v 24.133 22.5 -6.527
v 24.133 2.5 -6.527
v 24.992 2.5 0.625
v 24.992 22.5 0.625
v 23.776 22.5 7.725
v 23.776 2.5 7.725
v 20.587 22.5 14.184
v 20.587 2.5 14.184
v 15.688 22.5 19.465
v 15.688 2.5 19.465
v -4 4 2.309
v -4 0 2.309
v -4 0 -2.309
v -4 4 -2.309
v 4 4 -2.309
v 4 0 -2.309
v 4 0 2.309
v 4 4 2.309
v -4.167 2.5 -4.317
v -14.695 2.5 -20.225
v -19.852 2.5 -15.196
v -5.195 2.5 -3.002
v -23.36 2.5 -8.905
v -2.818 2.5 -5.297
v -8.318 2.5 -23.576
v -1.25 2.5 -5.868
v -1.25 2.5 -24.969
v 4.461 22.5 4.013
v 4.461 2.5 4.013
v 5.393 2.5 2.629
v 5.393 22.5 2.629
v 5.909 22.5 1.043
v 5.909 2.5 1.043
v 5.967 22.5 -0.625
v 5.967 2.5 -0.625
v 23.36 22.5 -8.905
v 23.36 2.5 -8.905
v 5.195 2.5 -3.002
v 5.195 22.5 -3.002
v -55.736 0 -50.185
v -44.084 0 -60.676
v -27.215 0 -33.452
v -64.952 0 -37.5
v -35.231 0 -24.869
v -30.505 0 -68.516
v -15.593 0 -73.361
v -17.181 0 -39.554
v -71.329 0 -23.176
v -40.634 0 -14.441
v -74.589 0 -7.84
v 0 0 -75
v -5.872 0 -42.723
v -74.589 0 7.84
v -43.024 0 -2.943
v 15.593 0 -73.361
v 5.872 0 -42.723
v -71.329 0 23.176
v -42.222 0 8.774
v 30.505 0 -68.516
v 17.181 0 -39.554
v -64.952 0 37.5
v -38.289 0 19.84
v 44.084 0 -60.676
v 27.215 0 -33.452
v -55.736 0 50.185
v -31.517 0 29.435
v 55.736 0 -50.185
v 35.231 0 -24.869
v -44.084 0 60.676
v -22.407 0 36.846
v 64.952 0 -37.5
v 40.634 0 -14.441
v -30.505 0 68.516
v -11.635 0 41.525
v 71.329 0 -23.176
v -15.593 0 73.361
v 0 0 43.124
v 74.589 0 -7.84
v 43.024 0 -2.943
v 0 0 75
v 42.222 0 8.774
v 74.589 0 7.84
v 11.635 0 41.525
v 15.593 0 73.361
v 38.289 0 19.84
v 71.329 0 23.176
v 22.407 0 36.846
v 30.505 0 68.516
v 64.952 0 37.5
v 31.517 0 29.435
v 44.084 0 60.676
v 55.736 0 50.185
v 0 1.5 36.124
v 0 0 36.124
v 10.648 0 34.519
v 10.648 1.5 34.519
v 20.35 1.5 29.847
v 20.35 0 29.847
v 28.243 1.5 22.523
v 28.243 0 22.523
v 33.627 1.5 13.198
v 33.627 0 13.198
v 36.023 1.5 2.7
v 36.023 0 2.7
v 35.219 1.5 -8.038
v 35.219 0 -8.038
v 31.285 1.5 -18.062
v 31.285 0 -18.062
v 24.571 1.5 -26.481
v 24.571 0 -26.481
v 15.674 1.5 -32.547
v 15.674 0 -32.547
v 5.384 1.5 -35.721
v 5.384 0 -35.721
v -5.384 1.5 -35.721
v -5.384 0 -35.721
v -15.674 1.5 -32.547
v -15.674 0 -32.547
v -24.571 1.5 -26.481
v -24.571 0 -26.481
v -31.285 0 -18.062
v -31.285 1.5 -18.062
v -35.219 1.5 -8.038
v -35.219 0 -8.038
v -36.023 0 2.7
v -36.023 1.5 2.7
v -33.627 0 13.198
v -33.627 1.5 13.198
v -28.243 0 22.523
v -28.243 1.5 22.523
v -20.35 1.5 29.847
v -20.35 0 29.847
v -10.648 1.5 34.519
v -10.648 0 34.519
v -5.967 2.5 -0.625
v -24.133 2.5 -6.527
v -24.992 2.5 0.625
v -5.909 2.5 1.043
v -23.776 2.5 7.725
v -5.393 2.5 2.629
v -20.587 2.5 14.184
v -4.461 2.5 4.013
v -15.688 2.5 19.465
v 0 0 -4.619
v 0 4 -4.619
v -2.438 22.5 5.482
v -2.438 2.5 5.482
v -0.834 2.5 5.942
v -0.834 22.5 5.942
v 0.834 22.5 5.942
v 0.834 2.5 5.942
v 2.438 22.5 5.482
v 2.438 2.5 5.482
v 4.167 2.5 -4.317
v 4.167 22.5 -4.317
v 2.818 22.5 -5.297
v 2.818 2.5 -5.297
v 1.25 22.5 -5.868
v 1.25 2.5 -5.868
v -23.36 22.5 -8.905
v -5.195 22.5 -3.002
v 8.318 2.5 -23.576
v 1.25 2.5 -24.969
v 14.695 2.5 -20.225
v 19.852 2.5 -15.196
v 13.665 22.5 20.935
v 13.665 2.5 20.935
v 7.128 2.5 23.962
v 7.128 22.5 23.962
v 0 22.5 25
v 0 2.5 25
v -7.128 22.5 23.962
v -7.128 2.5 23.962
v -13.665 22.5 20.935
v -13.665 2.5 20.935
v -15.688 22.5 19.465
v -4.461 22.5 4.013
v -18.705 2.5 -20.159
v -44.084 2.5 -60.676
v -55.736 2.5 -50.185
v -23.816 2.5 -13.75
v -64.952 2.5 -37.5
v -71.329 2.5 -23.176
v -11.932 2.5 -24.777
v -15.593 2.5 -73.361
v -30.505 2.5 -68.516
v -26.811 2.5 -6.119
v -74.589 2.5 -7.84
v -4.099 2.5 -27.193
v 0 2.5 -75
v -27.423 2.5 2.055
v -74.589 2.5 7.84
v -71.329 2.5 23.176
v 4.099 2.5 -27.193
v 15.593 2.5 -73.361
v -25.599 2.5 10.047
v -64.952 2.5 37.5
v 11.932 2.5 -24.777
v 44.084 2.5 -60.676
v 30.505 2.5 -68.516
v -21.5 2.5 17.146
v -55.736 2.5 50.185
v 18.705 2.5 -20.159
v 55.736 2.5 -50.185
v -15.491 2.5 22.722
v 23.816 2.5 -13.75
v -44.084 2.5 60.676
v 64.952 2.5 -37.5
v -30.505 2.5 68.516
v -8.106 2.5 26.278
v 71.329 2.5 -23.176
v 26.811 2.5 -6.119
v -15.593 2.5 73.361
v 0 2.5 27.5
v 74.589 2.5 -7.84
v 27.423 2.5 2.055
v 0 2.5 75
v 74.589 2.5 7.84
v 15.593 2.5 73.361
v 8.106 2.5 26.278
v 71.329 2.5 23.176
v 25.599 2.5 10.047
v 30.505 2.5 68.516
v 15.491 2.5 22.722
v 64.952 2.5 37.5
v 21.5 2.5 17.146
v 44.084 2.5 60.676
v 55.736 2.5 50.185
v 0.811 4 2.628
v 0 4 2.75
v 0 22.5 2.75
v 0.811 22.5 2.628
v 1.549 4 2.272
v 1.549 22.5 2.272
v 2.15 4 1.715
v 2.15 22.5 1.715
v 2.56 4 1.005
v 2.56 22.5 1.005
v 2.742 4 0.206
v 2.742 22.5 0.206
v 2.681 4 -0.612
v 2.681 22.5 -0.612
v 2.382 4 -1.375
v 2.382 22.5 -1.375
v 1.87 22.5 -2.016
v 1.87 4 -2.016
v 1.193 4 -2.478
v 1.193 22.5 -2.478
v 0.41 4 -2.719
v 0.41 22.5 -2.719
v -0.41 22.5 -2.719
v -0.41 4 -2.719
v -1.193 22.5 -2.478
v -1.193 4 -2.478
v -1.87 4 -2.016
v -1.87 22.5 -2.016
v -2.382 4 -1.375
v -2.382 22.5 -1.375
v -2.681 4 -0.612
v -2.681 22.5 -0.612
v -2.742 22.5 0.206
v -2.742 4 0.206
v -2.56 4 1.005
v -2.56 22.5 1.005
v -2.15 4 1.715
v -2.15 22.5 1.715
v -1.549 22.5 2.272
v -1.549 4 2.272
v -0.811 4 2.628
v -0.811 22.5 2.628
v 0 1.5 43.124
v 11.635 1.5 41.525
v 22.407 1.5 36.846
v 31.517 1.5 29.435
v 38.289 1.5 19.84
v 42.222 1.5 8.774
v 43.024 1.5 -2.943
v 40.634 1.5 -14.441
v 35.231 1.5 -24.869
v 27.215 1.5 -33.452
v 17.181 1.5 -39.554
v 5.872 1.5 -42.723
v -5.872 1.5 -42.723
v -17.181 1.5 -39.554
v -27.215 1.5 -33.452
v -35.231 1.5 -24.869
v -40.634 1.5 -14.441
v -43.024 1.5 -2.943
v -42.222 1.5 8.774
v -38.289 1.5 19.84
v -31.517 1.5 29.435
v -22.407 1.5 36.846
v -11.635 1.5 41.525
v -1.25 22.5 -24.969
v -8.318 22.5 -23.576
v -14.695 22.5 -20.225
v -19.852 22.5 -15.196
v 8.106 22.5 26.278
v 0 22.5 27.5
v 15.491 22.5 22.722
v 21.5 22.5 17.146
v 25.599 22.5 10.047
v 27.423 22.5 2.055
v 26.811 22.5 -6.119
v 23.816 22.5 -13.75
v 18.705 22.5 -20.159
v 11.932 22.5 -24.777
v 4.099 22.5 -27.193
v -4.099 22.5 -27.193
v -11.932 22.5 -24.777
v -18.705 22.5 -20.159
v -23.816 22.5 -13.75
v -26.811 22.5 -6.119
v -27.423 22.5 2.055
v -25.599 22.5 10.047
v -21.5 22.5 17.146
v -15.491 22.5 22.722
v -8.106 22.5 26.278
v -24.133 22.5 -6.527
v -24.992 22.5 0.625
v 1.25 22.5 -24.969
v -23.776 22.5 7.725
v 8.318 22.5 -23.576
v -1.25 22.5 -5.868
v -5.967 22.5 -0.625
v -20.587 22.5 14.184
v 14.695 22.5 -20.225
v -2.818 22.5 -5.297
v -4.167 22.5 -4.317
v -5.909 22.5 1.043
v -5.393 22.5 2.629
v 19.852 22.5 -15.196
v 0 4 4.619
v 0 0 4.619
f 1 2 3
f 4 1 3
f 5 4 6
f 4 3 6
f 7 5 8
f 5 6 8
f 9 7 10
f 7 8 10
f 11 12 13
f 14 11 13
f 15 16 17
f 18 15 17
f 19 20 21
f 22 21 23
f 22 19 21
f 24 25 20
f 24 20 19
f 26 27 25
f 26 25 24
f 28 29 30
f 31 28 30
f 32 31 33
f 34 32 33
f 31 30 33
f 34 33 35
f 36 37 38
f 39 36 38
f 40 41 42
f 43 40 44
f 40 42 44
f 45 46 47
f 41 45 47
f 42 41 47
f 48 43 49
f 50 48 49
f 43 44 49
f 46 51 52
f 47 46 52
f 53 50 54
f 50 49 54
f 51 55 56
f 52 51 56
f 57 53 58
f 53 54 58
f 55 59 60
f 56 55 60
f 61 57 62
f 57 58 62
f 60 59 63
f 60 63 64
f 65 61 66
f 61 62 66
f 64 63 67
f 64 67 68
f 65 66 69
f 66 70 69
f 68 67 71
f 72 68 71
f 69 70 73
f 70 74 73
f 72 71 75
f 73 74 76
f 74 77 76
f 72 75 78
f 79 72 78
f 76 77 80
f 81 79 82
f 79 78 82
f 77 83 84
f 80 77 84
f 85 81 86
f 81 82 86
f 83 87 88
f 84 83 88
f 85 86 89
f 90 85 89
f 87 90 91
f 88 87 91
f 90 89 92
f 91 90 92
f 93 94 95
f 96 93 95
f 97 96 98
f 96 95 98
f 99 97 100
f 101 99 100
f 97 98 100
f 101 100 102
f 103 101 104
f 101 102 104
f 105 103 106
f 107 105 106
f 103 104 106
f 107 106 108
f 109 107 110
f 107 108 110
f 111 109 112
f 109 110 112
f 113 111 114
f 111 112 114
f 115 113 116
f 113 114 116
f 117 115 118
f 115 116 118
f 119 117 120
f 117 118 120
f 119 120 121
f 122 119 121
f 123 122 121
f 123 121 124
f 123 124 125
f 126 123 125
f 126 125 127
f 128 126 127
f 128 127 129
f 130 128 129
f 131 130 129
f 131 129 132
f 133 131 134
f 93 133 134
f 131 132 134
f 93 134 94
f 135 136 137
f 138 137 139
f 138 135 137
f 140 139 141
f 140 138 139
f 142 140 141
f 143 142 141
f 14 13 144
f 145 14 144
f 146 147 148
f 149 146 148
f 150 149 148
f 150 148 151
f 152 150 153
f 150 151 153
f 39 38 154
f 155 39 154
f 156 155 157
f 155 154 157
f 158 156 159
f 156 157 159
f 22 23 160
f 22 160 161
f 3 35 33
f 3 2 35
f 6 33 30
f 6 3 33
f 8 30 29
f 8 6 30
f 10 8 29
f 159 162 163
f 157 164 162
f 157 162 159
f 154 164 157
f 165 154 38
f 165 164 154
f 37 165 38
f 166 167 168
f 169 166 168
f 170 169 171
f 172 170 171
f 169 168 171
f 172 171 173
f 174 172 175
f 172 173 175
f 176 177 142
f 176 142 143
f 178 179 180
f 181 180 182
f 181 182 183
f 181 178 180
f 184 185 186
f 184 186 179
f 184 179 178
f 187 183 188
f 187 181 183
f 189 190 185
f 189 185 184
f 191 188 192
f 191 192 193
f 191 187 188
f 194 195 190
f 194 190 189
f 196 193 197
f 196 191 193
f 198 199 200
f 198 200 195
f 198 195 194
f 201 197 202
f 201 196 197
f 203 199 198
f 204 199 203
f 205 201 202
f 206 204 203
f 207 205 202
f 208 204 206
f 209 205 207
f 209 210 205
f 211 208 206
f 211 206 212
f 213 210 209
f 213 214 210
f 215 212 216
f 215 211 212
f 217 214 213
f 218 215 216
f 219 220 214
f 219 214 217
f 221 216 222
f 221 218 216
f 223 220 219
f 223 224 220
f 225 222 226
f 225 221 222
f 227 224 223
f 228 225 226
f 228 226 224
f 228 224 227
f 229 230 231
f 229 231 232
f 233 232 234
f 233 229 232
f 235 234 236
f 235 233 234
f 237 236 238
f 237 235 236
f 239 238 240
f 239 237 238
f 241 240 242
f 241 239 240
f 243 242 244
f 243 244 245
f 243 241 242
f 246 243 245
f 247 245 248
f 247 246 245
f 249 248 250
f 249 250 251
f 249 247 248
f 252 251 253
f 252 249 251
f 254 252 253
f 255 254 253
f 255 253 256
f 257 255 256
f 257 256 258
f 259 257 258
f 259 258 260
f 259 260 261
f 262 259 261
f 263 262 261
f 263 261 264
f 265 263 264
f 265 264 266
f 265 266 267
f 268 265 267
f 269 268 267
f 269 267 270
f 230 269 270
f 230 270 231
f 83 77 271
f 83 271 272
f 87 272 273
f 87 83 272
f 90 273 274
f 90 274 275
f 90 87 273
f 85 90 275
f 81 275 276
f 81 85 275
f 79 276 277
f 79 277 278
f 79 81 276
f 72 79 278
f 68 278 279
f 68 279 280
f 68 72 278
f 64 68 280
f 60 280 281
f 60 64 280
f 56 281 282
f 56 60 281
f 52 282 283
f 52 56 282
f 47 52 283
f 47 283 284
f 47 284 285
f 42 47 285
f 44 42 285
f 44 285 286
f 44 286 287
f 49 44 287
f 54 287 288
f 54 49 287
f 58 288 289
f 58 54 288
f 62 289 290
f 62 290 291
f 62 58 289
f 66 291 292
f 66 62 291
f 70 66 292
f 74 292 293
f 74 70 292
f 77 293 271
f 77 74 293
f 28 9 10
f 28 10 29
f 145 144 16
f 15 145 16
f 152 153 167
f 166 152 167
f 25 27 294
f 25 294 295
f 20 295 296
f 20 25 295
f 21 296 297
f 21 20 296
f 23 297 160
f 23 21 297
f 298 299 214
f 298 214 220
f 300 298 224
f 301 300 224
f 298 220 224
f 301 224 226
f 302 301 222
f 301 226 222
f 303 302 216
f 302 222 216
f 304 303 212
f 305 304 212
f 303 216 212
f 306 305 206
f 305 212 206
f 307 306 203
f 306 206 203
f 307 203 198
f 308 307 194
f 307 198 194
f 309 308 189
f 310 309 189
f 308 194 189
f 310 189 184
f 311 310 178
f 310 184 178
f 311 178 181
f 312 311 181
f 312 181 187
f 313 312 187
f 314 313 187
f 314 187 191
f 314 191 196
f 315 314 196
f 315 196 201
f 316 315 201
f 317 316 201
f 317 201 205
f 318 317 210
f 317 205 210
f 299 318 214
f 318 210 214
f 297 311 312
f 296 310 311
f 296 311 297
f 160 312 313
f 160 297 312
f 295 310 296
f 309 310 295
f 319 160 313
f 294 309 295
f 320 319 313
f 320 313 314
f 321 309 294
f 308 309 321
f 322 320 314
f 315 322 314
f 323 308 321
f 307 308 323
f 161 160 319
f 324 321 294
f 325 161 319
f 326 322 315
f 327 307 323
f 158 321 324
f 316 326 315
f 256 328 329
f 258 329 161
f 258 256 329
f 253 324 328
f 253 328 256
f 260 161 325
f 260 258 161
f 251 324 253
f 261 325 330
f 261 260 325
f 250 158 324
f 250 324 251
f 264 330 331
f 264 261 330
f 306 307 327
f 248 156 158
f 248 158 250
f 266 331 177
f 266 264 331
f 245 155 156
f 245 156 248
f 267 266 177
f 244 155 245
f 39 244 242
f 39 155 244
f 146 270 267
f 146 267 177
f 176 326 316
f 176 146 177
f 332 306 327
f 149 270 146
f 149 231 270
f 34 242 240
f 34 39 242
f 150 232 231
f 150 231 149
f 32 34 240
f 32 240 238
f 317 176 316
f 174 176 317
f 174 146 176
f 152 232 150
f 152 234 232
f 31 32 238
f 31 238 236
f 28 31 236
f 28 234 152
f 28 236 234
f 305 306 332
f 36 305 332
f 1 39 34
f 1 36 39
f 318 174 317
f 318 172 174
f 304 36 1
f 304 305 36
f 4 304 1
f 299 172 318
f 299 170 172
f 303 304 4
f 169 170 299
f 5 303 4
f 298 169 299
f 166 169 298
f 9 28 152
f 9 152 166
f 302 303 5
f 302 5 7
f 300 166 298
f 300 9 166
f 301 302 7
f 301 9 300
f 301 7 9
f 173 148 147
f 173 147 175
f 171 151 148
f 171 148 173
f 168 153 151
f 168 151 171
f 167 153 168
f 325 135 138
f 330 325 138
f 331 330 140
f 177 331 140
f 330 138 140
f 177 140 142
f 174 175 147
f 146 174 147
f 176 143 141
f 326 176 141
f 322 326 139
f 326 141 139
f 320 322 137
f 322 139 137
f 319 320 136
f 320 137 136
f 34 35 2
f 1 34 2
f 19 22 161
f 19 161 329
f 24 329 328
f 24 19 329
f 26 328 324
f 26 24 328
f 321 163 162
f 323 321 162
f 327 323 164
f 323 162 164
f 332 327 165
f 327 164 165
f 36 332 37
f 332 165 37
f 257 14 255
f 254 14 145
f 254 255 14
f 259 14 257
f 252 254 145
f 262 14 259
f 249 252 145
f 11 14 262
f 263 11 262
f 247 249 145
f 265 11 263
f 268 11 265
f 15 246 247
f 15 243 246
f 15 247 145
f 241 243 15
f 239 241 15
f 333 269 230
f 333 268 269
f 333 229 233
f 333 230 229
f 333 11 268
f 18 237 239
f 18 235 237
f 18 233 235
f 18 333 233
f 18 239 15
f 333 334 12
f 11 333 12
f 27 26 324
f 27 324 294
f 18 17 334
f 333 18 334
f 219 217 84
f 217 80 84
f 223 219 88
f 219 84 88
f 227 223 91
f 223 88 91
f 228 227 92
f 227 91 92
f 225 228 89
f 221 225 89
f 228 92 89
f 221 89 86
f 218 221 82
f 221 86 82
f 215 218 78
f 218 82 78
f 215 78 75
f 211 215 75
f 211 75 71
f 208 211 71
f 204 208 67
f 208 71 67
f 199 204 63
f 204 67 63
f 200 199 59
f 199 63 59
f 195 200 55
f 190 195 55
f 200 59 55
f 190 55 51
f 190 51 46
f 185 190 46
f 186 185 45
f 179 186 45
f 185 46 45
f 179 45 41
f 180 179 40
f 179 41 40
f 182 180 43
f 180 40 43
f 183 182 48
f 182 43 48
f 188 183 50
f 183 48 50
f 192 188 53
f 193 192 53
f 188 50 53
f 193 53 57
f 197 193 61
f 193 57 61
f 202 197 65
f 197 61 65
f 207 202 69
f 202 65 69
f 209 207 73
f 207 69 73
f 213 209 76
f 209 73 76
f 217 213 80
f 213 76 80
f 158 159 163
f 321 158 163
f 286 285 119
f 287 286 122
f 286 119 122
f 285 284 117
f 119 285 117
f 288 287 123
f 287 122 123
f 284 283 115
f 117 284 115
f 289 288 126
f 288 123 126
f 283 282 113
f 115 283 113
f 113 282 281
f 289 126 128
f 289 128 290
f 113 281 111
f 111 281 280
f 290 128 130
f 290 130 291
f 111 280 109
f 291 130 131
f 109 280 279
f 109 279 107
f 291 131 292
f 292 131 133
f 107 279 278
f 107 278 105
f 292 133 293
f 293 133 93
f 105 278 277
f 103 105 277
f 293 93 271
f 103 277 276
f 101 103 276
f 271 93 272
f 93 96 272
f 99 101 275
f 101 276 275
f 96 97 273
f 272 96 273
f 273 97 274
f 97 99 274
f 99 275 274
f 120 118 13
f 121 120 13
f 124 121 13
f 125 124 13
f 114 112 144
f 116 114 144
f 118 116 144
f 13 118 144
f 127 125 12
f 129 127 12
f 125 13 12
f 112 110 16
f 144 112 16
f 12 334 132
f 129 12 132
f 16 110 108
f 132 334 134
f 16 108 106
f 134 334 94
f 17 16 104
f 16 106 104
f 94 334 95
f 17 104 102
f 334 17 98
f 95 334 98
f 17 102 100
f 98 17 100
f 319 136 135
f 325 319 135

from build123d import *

# Parameters (mm, degrees)
SKETCH1_R           = 36.124355653
BOSS_EXTRUDE1_DEPTH = 1.5
SKETCH3_R           = 75
SKETCH3_R_2         = 43.124355653
BOSS_EXTRUDE2_DEPTH = 1.5
SKETCH4_R           = 75
BOSS_EXTRUDE3_DEPTH = 1
SKETCH5_R           = 27.5
SKETCH5_R_2         = 2.75
BOSS_EXTRUDE4_DEPTH = 20
CUT_EXTRUDE1_DEPTH  = 4


with BuildPart() as part:
    # Sketch1 → Boss-Extrude1 (new body)
    with BuildSketch(Plane(origin=(0, 0, 0), x_dir=(1, 0, 0), z_dir=(0, 1, 0))):
        with Locations(Location((0, 0, 0), (0, 0, 270))):
            Circle(SKETCH1_R)
    extrude(amount=BOSS_EXTRUDE1_DEPTH)



with BuildPart() as body_2:
    # Sketch3 → Boss-Extrude2 (new body)
    with BuildSketch(Plane(origin=(0, 0, 0), x_dir=(1, 0, 0), z_dir=(0, 1, 0))):
        with Locations(Location((0, 0, 0), (0, 0, 270))):
            Circle(SKETCH3_R)
        with Locations(Location((0, 0, 0), (0, 0, 270))):
            Circle(SKETCH3_R_2, mode=Mode.SUBTRACT)
    extrude(amount=BOSS_EXTRUDE2_DEPTH)


with BuildPart() as part_1:
    add(part.part)

    add(body_2.part)  # Boss-Extrude3 merges body 2
    # Sketch4 → Boss-Extrude3 (add)
    with BuildSketch(Plane(origin=(0, 1.5, 0), x_dir=(1, 0, 0), z_dir=(0, 1, 0))):
        with Locations(Location((0, 0, 0), (0, 0, 270))):
            Circle(SKETCH4_R)
    extrude(amount=BOSS_EXTRUDE3_DEPTH)

    # Sketch5 → Boss-Extrude4 (add)
    with BuildSketch(Plane(origin=(0, 2.5, 0), x_dir=(1, 0, 0), z_dir=(0, 1, 0))):
        with Locations(Location((0, 0, 0), (0, 0, 270))):
            Circle(SKETCH5_R)
        with Locations(Location((0, 0, 0), (0, 0, 270))):
            Circle(SKETCH5_R_2, mode=Mode.SUBTRACT)
        with BuildLine():
            Line((-1.25, 5.868347297), (-1.25, 24.968730444))
            ThreePointArc((-1.25, 24.968730444), (-14.694631307, 20.225424859), (-23.36040255, 8.904582681))
            Line((-23.36040255, 8.904582681), (-5.194858694, 3.002239689))
            ThreePointArc((-5.194858694, 3.002239689), (-3.526711514, 4.854101966), (-1.25, 5.868347297))
        make_face(mode=Mode.SUBTRACT)
        with BuildLine():
            Line((1.25, 5.868347297), (1.25, 24.968730444))
            ThreePointArc((1.25, 24.968730444), (14.694631307, 20.225424859), (23.36040255, 8.904582681))
            Line((23.36040255, 8.904582681), (5.194858694, 3.002239689))
            ThreePointArc((5.194858694, 3.002239689), (3.526711514, 4.854101966), (1.25, 5.868347297))
        make_face(mode=Mode.SUBTRACT)
        with BuildLine():
            Line((5.96740118, 0.624598398), (24.132945036, 6.52694139))
            ThreePointArc((24.132945036, 6.52694139), (23.776412907, -7.725424859), (15.687522767, -19.465395692))
            Line((15.687522767, -19.465395692), (4.46059924, -4.012861127))
            ThreePointArc((4.46059924, -4.012861127), (5.706339098, -1.854101966), (5.96740118, 0.624598398))
        make_face(mode=Mode.SUBTRACT)
        with BuildLine():
            Line((2.438056754, -5.482324258), (13.664980281, -20.934858823))
            ThreePointArc((13.664980281, -20.934858823), (0, -25), (-13.664980281, -20.934858823))
            Line((-13.664980281, -20.934858823), (-2.438056754, -5.482324258))
            ThreePointArc((-2.438056754, -5.482324258), (0, -6), (2.438056754, -5.482324258))
        make_face(mode=Mode.SUBTRACT)
        with BuildLine():
            Line((-4.46059924, -4.012861127), (-15.687522767, -19.465395692))
            ThreePointArc((-15.687522767, -19.465395692), (-23.776412907, -7.725424859), (-24.132945036, 6.52694139))
            Line((-24.132945036, 6.52694139), (-5.96740118, 0.624598398))
            ThreePointArc((-5.96740118, 0.624598398), (-5.706339098, -1.854101966), (-4.46059924, -4.012861127))
        make_face(mode=Mode.SUBTRACT)
    extrude(amount=BOSS_EXTRUDE4_DEPTH)

    # Sketch6 → Cut-Extrude1 (cut)
    with BuildSketch(Plane.XZ):
        Polygon((-4, 2.309401077), (-4, -2.309401077), (0, -4.618802154), (4, -2.309401077), (4, 2.309401077), (0, 4.618802154), align=None)
    extrude(amount=-CUT_EXTRUDE1_DEPTH, mode=Mode.SUBTRACT)


solid = part_1.part
